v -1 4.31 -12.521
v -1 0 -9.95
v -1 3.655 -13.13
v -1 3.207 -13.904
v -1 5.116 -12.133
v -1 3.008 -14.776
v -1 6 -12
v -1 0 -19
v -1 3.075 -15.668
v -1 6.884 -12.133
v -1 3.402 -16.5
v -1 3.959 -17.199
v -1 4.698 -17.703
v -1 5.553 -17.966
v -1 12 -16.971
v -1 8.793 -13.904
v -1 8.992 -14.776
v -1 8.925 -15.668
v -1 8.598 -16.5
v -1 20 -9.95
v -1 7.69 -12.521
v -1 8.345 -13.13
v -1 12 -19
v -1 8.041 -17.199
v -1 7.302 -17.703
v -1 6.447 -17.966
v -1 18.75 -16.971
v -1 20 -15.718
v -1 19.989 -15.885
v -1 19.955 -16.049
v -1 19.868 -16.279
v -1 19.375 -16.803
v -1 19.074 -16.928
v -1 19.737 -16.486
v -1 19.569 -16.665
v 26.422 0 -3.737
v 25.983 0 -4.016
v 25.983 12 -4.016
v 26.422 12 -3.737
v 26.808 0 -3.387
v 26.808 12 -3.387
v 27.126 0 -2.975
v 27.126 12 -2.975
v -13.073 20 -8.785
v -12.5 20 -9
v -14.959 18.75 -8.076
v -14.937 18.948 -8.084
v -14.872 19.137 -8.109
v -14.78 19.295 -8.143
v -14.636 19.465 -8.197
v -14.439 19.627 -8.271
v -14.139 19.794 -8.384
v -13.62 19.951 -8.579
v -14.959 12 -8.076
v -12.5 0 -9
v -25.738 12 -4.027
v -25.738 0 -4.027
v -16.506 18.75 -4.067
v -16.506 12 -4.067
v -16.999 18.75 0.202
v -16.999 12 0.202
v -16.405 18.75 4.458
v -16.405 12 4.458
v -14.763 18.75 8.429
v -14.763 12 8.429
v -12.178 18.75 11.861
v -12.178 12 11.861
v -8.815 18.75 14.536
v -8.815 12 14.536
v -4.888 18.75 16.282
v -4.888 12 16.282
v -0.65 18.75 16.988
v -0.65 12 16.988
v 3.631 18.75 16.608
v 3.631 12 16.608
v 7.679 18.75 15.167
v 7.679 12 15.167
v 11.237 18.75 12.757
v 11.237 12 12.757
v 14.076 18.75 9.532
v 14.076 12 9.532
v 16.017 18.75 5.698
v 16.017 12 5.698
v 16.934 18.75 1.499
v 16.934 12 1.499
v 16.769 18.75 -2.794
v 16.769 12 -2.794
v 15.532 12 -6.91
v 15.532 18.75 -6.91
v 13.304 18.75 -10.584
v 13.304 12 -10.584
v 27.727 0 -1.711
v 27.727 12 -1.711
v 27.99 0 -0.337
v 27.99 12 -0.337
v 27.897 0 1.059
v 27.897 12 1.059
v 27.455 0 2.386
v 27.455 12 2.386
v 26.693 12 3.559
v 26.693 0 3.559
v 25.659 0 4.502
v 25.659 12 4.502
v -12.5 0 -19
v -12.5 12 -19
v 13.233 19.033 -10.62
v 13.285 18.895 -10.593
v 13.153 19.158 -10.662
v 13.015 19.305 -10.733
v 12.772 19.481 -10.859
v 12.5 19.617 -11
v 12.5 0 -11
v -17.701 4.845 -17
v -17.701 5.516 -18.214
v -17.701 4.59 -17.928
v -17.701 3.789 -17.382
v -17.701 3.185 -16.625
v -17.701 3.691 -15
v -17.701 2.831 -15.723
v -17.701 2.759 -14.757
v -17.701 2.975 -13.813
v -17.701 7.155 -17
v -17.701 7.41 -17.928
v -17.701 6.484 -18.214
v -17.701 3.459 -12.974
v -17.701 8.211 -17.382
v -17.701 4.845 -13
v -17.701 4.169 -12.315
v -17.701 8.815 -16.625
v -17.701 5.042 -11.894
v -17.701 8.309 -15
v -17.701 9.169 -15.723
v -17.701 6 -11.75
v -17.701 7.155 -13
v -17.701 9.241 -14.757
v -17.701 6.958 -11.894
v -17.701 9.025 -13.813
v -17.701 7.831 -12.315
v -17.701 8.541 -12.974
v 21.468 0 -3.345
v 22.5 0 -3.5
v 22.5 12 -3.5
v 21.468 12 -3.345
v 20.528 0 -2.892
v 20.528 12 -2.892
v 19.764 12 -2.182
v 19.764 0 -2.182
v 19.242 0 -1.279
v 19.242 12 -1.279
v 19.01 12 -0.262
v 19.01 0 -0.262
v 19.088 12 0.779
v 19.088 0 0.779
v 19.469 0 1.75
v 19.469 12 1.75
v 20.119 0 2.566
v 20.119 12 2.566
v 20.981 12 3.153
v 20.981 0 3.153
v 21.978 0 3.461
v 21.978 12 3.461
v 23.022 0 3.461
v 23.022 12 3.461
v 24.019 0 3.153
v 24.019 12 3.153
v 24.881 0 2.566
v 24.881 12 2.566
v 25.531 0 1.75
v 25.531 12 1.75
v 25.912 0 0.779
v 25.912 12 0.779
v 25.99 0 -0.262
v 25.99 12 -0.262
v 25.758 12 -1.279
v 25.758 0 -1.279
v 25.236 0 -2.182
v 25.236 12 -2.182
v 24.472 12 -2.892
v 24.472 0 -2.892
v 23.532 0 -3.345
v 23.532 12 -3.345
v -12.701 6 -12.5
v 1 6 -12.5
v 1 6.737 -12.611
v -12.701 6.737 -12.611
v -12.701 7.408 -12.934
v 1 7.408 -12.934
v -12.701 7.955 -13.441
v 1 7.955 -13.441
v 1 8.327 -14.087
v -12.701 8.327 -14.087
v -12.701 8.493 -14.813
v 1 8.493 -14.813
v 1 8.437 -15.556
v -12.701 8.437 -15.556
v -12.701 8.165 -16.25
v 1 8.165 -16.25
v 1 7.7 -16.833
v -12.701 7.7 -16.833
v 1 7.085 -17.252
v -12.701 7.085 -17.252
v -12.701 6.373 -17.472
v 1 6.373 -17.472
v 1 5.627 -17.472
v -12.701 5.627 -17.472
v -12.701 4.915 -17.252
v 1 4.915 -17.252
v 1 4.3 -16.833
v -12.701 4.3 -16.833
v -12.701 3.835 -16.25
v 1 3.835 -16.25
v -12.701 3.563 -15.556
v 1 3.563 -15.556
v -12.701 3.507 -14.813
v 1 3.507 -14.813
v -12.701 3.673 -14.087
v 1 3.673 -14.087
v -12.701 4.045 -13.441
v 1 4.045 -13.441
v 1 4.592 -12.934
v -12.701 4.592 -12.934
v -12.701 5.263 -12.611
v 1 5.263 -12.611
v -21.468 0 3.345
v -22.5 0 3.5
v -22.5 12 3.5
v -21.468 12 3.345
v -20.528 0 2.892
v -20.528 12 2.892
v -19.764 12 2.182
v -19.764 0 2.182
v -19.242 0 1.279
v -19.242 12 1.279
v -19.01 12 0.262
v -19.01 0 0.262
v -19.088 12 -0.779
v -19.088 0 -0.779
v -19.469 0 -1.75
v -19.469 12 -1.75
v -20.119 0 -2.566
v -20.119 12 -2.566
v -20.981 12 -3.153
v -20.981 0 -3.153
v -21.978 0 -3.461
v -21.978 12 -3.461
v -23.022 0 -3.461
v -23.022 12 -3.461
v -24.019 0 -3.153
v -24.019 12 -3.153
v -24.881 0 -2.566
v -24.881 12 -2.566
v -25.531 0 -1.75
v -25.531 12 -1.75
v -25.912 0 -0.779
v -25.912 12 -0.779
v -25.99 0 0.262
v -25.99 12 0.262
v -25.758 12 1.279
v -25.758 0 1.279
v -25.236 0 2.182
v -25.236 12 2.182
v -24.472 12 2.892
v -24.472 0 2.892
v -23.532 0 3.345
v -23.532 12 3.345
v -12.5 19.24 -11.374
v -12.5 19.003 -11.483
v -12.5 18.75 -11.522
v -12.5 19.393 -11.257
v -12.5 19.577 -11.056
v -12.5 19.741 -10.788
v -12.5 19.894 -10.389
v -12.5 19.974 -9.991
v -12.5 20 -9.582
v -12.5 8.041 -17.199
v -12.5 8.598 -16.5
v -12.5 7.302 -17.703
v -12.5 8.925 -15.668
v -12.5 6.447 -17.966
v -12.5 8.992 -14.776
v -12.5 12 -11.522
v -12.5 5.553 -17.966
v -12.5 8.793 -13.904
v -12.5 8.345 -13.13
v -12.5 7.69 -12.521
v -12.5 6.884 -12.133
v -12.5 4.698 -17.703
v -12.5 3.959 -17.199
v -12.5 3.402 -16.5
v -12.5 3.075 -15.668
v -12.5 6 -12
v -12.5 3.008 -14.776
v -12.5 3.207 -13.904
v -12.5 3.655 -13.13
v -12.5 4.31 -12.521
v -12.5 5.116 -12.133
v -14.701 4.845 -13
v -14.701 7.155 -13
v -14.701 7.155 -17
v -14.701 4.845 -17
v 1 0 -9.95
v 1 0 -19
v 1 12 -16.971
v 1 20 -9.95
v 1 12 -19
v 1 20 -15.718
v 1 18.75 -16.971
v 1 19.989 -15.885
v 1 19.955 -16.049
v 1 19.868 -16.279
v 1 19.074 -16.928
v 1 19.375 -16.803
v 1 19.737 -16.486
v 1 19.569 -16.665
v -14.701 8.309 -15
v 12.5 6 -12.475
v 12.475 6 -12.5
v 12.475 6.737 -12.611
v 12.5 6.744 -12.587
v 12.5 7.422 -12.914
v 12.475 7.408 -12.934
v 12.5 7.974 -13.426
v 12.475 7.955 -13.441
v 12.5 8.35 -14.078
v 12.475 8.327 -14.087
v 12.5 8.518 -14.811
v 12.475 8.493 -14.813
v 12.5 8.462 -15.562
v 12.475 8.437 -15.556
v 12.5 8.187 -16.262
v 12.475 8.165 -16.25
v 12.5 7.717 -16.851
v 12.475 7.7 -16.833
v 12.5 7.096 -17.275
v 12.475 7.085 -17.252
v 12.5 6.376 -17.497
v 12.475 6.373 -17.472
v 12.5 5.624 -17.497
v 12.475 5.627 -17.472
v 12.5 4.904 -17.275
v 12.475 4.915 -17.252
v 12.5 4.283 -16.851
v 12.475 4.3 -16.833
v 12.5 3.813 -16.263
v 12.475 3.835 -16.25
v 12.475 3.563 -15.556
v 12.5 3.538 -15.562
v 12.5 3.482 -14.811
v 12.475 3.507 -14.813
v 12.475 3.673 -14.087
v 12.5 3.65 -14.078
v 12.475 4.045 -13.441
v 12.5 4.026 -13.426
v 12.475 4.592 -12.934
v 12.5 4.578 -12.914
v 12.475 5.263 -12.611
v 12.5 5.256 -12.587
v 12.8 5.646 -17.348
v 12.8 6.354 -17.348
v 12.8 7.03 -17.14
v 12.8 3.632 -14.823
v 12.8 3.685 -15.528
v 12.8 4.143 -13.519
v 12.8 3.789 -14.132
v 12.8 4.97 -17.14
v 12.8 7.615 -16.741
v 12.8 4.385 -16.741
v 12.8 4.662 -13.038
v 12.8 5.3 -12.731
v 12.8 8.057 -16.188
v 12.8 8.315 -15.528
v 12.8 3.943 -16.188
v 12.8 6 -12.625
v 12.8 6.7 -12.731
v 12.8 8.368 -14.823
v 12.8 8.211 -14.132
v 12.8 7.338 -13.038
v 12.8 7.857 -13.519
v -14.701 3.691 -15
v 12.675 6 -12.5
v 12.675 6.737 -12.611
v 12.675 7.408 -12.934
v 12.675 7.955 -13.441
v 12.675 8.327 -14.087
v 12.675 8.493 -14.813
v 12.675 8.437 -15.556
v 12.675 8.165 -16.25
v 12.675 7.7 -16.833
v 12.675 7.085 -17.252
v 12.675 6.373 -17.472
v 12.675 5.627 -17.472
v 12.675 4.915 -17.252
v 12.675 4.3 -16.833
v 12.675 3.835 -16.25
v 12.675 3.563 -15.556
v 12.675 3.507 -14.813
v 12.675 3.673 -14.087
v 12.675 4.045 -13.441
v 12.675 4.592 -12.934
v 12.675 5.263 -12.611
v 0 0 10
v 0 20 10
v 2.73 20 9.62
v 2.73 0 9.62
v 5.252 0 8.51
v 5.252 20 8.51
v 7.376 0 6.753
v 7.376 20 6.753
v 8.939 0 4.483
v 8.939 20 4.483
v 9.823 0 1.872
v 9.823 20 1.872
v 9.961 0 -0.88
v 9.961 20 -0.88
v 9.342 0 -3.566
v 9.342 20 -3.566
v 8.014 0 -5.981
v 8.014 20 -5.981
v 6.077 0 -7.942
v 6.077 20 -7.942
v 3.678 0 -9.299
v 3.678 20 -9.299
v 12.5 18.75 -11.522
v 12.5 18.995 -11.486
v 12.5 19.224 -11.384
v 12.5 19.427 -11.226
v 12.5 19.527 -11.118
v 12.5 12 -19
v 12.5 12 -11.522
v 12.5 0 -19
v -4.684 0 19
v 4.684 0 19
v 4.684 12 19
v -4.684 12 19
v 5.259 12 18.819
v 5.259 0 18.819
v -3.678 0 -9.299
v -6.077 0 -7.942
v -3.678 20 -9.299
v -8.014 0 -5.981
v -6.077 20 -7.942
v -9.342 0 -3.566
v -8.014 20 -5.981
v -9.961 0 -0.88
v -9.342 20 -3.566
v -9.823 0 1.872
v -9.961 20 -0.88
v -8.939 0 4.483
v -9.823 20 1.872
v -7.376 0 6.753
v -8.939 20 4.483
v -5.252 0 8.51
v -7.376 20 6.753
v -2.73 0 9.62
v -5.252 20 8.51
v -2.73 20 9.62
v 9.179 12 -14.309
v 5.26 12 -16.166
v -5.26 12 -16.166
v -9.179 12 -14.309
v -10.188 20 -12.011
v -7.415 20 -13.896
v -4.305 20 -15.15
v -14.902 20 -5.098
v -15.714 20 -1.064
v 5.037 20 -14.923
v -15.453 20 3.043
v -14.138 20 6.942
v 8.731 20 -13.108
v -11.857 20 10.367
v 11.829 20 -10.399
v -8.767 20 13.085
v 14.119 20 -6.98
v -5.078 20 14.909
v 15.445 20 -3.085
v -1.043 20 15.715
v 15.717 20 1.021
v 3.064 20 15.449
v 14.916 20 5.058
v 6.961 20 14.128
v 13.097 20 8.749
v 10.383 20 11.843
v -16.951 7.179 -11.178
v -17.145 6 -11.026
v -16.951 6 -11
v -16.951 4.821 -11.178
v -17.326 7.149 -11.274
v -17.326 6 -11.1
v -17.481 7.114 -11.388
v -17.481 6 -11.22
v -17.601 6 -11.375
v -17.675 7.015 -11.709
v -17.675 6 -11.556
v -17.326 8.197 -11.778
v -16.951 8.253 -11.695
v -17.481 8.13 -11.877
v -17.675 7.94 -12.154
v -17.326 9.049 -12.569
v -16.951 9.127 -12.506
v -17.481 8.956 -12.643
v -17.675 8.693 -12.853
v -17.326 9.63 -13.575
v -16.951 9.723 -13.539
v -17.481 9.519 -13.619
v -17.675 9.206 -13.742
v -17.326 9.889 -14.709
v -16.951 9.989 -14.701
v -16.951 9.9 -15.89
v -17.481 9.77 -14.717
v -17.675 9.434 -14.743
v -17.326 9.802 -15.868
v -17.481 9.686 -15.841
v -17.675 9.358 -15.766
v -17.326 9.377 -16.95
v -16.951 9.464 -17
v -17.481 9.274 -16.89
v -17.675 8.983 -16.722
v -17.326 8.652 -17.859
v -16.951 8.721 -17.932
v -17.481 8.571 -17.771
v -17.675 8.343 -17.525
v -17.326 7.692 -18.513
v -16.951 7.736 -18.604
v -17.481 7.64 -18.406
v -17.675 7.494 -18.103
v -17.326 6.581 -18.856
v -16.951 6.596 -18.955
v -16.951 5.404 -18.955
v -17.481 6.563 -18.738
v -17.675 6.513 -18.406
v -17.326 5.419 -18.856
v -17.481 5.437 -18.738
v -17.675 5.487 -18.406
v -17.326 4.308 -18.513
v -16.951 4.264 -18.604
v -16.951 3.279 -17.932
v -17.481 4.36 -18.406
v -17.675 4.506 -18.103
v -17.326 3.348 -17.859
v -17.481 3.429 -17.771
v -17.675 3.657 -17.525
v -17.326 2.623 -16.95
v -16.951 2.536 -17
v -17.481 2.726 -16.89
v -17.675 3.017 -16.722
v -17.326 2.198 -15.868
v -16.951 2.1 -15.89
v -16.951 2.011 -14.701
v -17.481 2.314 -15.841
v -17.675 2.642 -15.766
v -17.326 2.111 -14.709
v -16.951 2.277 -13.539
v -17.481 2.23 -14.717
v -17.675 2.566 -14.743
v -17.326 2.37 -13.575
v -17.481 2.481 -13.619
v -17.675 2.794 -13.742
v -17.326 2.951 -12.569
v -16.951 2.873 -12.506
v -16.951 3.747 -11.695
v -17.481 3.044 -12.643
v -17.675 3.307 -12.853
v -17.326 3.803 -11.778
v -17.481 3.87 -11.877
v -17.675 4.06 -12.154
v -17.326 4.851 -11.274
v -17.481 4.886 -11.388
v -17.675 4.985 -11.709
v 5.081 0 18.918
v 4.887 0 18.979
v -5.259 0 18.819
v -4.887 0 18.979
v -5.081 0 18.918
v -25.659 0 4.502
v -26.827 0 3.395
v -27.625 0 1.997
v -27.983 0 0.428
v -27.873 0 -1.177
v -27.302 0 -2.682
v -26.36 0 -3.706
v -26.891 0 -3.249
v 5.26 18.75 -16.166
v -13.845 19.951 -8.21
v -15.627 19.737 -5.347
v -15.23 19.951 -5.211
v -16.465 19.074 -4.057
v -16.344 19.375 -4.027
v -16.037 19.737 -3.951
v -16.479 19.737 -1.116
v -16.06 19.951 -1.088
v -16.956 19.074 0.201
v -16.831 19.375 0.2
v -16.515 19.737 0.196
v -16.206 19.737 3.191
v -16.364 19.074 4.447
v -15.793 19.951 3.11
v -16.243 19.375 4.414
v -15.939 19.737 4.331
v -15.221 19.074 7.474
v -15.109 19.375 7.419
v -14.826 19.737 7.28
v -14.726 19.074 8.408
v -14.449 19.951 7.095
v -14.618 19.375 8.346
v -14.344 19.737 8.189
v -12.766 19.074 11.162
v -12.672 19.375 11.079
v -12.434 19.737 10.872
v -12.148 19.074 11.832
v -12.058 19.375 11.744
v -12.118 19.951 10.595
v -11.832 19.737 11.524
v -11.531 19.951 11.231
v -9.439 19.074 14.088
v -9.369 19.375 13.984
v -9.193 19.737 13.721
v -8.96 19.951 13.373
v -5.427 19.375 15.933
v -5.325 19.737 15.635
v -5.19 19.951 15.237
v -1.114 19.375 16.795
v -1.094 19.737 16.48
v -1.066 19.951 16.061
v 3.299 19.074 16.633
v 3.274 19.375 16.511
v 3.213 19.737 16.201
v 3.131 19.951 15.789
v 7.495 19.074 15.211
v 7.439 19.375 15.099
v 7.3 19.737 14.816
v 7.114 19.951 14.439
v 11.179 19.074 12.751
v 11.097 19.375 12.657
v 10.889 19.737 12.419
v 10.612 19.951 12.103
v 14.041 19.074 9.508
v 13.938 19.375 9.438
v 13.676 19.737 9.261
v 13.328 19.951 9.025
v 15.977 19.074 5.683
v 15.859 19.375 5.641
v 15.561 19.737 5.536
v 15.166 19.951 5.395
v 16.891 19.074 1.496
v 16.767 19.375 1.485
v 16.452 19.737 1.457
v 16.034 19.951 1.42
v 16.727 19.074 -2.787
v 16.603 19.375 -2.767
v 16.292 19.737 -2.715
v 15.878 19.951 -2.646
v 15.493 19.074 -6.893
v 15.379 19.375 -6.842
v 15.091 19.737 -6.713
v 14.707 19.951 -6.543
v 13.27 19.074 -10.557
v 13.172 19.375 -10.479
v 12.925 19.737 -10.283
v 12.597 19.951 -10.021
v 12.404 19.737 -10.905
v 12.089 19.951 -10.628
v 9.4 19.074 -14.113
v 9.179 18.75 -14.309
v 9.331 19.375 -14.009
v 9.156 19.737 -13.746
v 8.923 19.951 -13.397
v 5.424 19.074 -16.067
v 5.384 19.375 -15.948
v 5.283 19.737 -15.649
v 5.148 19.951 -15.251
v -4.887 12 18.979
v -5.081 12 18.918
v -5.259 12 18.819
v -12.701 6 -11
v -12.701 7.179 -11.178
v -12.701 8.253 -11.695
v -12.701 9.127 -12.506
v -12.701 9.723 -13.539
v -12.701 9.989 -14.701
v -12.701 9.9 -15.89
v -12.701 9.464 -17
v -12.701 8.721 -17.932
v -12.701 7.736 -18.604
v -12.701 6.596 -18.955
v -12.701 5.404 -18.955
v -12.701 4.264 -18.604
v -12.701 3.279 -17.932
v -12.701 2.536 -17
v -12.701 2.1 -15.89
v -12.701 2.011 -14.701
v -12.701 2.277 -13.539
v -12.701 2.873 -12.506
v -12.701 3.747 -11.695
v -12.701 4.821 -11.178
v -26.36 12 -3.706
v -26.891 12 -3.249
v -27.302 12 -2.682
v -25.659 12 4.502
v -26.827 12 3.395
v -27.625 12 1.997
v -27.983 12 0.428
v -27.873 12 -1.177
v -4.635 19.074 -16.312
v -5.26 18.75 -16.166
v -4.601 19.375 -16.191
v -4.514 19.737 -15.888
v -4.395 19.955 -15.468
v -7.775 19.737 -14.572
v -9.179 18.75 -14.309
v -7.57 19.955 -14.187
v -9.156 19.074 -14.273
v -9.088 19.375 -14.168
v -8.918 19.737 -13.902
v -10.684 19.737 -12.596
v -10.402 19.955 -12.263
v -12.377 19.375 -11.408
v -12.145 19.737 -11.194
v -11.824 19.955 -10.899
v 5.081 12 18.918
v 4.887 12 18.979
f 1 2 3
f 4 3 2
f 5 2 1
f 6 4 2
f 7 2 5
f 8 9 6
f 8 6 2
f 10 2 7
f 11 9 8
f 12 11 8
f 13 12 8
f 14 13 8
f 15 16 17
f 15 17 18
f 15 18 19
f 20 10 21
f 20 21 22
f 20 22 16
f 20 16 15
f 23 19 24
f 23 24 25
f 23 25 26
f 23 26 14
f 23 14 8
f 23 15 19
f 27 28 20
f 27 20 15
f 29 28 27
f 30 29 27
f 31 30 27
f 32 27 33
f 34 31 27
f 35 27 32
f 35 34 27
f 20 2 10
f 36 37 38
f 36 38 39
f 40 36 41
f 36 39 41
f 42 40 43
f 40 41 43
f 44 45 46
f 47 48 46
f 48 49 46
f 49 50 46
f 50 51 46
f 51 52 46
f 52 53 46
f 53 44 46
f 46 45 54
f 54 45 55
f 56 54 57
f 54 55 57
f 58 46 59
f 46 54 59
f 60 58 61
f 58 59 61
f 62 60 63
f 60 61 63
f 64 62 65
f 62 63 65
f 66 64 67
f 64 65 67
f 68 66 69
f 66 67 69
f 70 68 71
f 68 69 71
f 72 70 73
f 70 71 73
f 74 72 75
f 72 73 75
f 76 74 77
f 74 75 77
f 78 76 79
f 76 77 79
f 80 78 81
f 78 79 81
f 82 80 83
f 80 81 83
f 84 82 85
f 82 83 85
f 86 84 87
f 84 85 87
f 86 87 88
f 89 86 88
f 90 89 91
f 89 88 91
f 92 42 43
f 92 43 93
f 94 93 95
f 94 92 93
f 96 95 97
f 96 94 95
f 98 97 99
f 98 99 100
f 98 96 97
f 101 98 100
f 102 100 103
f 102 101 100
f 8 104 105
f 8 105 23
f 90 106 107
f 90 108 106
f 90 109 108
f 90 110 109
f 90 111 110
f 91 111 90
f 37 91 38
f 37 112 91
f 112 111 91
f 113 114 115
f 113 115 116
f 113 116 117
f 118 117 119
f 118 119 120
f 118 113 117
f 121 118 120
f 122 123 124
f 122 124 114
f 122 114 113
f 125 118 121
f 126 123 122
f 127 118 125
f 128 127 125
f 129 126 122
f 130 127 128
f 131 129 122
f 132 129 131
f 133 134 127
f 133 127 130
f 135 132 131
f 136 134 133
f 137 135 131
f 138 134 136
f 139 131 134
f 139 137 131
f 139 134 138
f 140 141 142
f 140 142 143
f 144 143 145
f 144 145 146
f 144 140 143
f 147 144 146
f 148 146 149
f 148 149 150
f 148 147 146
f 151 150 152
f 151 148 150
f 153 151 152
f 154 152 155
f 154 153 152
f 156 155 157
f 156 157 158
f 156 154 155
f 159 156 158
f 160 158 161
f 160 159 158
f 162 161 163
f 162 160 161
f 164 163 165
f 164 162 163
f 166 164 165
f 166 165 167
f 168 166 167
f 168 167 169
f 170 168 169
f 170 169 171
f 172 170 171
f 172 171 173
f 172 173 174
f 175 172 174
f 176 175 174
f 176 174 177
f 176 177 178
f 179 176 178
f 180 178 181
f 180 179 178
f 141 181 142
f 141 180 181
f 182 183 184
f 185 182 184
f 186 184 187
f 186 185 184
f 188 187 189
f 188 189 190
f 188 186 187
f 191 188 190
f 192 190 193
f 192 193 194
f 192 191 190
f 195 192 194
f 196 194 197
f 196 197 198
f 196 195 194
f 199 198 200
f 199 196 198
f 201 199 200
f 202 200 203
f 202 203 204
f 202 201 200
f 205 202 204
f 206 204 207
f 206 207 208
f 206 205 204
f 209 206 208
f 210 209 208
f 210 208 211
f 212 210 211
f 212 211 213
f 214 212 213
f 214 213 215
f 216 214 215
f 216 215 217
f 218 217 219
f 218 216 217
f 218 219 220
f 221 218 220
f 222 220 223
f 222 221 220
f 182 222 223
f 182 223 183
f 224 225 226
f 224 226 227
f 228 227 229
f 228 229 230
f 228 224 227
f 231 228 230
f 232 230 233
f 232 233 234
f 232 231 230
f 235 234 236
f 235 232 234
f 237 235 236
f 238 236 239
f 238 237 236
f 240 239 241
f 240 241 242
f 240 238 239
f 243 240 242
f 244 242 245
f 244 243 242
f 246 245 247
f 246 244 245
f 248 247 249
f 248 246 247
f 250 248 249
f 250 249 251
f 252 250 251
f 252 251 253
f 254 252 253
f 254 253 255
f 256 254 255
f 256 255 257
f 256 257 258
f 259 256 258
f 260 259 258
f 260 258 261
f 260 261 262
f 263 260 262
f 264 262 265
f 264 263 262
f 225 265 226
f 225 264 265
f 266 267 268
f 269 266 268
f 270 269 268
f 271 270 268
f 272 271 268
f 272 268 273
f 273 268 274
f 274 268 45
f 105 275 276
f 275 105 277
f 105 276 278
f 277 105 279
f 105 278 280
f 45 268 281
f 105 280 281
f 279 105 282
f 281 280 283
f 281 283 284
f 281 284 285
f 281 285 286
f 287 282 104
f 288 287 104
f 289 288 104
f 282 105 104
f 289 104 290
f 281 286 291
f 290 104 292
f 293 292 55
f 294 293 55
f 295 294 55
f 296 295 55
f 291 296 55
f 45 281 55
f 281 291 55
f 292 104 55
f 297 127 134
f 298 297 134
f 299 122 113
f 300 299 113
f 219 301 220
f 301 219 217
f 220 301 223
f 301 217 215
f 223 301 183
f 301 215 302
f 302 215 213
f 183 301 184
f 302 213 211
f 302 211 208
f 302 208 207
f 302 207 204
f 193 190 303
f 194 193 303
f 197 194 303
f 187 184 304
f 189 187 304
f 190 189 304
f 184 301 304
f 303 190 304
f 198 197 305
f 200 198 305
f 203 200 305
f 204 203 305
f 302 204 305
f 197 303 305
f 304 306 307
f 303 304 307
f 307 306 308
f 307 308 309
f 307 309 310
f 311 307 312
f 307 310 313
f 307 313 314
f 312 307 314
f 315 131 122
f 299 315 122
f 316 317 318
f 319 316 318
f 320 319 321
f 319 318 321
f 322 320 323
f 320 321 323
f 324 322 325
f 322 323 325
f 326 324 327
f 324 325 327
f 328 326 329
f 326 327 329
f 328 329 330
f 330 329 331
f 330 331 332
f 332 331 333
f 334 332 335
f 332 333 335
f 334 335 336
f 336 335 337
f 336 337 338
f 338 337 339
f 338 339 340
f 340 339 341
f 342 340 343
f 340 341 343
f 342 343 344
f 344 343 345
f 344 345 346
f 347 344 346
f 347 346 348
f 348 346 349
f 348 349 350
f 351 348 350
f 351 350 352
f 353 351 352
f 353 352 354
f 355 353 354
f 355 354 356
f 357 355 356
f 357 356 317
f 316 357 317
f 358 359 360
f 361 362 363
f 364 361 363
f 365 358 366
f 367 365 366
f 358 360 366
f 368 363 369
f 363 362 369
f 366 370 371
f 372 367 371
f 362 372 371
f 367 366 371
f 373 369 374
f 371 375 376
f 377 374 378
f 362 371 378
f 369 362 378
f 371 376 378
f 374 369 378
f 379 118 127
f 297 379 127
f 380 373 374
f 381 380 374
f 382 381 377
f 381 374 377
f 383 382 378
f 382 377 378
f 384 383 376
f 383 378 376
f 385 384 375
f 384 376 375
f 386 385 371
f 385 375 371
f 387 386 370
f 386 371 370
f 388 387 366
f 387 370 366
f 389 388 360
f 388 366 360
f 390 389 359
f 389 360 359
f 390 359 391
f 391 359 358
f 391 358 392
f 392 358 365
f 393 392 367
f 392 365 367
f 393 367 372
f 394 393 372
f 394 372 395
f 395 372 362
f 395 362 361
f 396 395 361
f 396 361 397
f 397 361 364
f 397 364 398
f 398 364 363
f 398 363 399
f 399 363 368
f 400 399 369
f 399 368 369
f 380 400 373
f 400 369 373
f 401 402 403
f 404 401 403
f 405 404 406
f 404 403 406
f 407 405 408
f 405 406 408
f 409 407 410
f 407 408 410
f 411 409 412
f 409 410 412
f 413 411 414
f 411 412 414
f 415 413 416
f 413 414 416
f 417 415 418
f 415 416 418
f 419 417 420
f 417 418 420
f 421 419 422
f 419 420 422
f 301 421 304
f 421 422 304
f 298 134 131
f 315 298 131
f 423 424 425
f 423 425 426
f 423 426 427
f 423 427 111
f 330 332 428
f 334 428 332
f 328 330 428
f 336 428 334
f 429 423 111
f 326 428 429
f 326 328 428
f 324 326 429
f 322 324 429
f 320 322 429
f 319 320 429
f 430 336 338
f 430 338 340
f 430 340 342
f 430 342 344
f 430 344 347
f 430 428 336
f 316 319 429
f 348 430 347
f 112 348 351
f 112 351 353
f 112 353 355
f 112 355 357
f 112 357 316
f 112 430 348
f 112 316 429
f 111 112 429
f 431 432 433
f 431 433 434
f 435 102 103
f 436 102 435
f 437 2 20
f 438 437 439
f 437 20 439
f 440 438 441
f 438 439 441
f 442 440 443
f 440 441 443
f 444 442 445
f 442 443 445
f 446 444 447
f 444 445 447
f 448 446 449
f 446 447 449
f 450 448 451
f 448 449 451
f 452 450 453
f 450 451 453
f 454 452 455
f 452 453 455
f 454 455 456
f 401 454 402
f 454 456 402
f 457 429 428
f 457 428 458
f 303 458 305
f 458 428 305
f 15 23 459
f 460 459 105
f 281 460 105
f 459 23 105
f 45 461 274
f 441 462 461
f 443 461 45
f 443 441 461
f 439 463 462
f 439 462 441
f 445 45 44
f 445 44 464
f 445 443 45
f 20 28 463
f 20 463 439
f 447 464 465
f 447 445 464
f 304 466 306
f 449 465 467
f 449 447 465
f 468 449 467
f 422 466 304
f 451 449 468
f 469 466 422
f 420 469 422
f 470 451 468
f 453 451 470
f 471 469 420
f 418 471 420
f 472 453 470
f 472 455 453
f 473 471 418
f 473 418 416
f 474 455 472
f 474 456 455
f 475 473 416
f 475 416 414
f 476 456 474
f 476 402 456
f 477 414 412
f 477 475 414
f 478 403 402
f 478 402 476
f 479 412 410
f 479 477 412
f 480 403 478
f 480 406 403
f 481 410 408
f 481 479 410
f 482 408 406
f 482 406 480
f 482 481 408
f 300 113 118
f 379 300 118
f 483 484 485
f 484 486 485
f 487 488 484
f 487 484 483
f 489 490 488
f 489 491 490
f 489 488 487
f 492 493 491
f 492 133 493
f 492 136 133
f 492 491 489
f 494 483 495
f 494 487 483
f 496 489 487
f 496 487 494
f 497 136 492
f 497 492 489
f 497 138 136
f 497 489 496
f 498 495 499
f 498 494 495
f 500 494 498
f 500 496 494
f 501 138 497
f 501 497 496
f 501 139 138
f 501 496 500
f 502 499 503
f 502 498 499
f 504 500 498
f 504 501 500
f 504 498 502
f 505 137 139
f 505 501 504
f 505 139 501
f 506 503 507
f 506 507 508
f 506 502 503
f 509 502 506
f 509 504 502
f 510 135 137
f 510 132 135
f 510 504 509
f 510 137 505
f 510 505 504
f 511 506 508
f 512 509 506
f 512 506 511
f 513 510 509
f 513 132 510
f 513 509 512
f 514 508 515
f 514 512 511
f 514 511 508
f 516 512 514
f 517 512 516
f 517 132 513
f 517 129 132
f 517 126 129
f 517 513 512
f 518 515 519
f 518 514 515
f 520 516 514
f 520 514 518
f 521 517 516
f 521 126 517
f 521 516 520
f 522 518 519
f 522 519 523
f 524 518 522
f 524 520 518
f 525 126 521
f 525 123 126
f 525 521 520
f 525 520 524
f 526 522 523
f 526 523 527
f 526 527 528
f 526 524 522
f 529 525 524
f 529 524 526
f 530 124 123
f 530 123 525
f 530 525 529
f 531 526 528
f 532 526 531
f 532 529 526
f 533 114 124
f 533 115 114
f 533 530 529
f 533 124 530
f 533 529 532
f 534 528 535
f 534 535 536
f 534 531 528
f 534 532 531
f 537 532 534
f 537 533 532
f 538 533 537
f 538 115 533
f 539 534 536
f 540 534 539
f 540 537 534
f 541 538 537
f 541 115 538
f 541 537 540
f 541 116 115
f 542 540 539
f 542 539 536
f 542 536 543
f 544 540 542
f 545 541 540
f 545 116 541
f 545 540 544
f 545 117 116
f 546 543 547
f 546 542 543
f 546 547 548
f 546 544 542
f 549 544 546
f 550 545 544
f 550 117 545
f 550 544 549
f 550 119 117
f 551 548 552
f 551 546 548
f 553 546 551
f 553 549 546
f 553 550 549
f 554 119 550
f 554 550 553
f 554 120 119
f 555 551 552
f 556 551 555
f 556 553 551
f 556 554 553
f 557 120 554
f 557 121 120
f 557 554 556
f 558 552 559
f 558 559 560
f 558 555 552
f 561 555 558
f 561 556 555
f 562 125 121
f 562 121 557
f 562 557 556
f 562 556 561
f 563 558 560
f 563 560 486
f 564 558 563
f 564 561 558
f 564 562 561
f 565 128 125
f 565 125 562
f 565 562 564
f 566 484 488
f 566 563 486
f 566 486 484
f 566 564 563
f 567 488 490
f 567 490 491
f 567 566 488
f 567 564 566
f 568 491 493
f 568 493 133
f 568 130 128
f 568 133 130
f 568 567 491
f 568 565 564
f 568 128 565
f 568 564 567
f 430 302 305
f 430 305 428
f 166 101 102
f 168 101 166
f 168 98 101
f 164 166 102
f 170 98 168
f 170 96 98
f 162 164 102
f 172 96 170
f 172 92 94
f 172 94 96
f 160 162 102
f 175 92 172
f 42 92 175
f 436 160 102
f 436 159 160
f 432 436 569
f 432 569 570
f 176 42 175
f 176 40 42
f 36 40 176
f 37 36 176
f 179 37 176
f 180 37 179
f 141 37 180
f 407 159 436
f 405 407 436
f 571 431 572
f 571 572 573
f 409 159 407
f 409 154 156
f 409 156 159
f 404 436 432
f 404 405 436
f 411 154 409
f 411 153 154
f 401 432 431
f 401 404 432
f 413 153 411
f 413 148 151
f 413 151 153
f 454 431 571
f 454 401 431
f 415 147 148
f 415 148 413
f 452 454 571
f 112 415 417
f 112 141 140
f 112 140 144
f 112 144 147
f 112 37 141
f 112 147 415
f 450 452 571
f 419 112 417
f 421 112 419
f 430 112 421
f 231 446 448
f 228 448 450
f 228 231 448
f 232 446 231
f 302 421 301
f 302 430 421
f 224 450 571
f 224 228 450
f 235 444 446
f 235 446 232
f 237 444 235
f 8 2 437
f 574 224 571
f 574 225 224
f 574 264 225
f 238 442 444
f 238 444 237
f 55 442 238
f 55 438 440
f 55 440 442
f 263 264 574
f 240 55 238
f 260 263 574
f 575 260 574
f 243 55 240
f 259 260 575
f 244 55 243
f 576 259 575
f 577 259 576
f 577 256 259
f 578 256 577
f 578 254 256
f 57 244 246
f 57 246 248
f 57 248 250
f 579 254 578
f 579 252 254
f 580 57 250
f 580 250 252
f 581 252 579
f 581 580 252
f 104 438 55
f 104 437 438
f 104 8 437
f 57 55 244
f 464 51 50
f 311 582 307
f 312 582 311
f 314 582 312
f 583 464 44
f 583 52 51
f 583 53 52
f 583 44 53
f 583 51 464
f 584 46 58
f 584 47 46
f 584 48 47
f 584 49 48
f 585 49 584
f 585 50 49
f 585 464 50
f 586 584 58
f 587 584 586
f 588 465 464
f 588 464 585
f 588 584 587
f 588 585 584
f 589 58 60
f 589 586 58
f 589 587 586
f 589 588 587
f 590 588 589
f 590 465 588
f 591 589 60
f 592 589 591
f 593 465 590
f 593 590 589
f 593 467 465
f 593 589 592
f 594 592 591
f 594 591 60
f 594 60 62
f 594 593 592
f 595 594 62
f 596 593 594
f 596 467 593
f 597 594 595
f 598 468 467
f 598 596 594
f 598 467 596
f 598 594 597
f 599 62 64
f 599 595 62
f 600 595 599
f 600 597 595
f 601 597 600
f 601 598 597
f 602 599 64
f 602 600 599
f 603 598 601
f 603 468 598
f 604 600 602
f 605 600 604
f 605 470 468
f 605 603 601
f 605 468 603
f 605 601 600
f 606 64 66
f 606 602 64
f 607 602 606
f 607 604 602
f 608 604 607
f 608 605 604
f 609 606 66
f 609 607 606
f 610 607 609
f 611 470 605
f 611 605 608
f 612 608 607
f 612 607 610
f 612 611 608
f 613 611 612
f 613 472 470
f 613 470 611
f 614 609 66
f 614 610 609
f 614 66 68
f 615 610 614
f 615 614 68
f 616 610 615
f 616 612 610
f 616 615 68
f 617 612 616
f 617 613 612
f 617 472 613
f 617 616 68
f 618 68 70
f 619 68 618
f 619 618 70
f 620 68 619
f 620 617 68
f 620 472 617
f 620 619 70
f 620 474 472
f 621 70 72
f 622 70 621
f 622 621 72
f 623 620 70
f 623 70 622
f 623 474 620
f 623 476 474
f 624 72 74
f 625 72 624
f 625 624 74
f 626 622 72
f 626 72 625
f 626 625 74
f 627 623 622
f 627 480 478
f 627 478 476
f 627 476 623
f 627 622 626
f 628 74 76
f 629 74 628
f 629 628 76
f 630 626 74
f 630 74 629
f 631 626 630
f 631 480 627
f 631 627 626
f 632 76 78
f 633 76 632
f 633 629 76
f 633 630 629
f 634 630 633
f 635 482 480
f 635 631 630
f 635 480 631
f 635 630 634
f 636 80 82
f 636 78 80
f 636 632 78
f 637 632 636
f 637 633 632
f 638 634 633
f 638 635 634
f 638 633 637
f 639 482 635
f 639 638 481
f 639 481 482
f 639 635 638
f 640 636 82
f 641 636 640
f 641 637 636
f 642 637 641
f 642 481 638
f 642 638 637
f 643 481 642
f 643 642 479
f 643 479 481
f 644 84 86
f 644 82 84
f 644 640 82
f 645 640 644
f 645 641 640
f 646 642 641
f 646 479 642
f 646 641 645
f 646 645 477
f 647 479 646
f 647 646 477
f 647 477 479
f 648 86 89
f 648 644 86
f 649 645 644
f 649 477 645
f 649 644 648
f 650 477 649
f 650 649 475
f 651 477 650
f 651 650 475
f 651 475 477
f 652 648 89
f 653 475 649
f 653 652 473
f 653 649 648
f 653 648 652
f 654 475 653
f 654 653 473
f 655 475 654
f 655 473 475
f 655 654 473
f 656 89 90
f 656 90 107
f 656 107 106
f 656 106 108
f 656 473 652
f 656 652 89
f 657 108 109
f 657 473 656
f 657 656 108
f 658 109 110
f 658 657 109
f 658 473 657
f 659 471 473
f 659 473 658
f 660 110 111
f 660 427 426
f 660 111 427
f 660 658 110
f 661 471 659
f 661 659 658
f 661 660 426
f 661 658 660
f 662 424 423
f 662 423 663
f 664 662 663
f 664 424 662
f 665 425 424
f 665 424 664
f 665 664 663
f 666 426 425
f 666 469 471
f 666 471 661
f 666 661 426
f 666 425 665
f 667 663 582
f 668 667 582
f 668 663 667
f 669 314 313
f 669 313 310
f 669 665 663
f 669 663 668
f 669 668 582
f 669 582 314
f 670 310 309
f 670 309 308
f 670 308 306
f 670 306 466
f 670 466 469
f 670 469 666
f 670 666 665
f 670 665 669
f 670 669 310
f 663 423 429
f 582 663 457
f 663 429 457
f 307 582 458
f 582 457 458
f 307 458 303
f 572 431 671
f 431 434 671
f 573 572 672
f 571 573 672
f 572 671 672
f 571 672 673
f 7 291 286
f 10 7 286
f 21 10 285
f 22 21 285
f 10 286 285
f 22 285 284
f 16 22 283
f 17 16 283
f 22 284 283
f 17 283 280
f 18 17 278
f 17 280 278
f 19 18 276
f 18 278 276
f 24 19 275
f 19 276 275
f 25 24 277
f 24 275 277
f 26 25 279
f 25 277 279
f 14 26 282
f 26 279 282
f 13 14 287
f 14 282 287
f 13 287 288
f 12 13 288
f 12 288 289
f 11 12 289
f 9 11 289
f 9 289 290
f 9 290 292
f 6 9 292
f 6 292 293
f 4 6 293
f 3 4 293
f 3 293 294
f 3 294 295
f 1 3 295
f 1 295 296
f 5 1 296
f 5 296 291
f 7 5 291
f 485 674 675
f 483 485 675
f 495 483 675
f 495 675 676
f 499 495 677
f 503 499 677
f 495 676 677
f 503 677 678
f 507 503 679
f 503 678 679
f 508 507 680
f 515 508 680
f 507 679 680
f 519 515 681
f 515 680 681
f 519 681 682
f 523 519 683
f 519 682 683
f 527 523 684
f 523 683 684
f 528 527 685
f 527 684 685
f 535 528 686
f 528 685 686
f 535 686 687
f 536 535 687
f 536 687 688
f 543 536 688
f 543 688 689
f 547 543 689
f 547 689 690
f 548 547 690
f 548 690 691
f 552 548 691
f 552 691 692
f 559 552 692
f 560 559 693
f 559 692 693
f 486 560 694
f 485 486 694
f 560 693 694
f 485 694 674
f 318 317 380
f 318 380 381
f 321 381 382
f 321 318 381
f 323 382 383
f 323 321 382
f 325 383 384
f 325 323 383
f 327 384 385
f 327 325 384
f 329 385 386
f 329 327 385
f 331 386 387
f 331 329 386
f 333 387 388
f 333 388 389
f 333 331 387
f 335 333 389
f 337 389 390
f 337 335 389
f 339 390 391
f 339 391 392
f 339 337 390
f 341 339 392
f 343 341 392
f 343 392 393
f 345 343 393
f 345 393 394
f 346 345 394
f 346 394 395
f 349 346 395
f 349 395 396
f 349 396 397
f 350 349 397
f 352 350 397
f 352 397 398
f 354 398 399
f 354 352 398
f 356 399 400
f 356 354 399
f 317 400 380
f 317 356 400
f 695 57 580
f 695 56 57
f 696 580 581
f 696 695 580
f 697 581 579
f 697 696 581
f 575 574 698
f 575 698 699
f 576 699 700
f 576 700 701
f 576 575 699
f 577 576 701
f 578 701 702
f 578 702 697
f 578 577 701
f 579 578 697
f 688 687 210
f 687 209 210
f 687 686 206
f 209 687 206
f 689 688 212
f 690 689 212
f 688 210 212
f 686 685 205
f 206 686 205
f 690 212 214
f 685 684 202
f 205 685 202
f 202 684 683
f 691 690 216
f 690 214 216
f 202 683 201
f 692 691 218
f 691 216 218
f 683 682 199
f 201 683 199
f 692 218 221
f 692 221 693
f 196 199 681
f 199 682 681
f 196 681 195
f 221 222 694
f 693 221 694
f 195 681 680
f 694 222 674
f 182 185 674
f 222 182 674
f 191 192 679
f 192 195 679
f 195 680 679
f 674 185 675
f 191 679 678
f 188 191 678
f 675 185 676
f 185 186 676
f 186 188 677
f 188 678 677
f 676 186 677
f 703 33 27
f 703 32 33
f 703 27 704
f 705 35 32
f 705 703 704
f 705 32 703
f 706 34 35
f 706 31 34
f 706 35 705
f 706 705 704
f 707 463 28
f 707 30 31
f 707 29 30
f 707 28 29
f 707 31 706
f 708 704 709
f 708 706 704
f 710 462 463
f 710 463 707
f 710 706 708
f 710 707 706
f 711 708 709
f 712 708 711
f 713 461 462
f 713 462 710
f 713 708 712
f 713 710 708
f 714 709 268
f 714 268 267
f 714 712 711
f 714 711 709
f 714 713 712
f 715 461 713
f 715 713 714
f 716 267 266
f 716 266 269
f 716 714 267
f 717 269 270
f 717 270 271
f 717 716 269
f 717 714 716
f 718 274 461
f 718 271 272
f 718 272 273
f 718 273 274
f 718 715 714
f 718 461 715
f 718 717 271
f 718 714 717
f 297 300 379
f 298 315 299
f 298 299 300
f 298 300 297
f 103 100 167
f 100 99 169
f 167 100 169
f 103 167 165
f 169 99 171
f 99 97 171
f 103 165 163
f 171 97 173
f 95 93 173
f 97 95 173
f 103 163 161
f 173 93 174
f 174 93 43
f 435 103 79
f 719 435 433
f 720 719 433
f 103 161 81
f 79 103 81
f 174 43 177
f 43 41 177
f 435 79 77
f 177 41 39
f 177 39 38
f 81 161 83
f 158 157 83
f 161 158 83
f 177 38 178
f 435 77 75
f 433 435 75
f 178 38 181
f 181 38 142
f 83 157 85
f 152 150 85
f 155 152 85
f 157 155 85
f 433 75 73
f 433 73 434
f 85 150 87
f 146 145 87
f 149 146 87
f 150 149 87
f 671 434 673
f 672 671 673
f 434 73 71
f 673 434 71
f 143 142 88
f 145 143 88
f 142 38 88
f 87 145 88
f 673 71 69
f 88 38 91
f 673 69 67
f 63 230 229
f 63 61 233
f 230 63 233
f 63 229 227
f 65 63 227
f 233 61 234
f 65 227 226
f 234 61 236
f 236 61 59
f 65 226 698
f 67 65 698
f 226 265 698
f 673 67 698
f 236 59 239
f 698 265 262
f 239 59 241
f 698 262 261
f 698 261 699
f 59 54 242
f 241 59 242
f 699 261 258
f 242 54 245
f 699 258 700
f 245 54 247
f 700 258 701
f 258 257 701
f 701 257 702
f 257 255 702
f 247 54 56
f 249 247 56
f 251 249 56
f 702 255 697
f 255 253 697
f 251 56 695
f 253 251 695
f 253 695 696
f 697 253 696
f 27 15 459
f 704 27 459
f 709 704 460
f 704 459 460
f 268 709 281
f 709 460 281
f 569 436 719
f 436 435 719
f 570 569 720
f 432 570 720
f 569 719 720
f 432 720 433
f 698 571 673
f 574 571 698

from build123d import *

# Parameters (mm, degrees)
SKETCH1_R                   = 3.5
BOSS_EXTRUDE1_DEPTH         = 12
SKETCH3_R                   = 17
BOSS_EXTRUDE2_DEPTH         = 8
FILLET1_R                   = 1.25
CUT_EXTRUDE1_DEPTH          = 36.902646142
CUT_EXTRUDE1_DEPTH_BACK     = 36.902646142
SKETCH4_R                   = 10
CUT_EXTRUDE2_DEPTH          = 40.306488113
CUT_EXTRUDE2_DEPTH_BACK     = 40.306488113
SKETCH5_W                   = 2
SKETCH5_H                   = 20
CUT_EXTRUDE3_DEPTH          = 40.306488113
CUT_EXTRUDE3_DEPTH_BACK     = 40.306488113
SKETCH7_R                   = 3
CUT_EXTRUDE4_DEPTH          = 12.5
FILLET2_R                   = 3
FILLET3_R                   = 1
M5_TAPPED_HOLE2_D           = 4.2
M5_TAPPED_HOLE2_CSINK_D     = 5.05
M5_TAPPED_HOLE2_CSINK_ANGLE = 90
SKETCH26_R                  = 2.5
BOSS_EXTRUDE4_DEPTH         = 0.001
BOSS_EXTRUDE4_DEPTH_BACK    = 25.5
SKETCH28_R                  = 4
BOSS_EXTRUDE5_DEPTH         = 5
CHAMFER1_SIZE               = 0.125
CUT_EXTRUDE5_DEPTH          = 3
FILLET4_R                   = 0.75


with BuildPart() as part:
    # Sketch1 → Boss-Extrude1 (new body)
    with BuildSketch(Plane(origin=(0, 0, 0), x_dir=(1, 0, 0), z_dir=(0, 1, 0))):
        with BuildLine():
            Line((5, -19), (-5, -19))
            Line((-5, -19), (-25.659364193, -4.502045968))
            ThreePointArc((-25.659364193, -4.502045968), (-27.968143757, -0.591103926), (-26.548475243, 3.722881707))
            Line((-26.548475243, 3.722881707), (-12.5, 19))
            Line((-12.5, 19), (12.5, 19))
            Line((12.5, 19), (26.548475243, 3.722881707))
            ThreePointArc((26.548475243, 3.722881707), (27.968143757, -0.591103926), (25.659364193, -4.502045968))
            Line((25.659364193, -4.502045968), (5, -19))
        make_face()
        with Locations(Location((-22.5, 0, 0), (0, 0, 270))):
            Circle(SKETCH1_R, mode=Mode.SUBTRACT)
        with Locations(Location((22.5, 0, 0), (0, 0, 90))):
            Circle(SKETCH1_R, mode=Mode.SUBTRACT)
    extrude(amount=BOSS_EXTRUDE1_DEPTH)

    # Sketch3 → Boss-Extrude2 (add)
    with BuildSketch(Plane(origin=(0, 12, 0), x_dir=(1, 0, 0), z_dir=(0, 1, 0))):
        with Locations(Location((0, 0, 0), (0, 0, 270))):
            Circle(SKETCH3_R)
    extrude(amount=BOSS_EXTRUDE2_DEPTH)

    # Fillet1
    fillet1_edges = [part.edges().sort_by_distance(p)[0] for p in [
        (0, 20, -17),
    ]]
    fillet(fillet1_edges, radius=FILLET1_R)

    # Sketch2 → Cut-Extrude1 (cut, two sides)
    with BuildSketch(Plane(origin=(0, 12, 0), x_dir=(1, 0, 0), z_dir=(0, 1, 0))) as cut_extrude1_sk:
        Polygon((12.5, 19), (12.5, 11), (26.548475243, 3.722881707), align=None)
        Polygon((-12.5, 19), (-12.5, 8.999645995), (-26.548475243, 3.722881707), align=None)
    extrude(amount=CUT_EXTRUDE1_DEPTH, mode=Mode.SUBTRACT)
    extrude(cut_extrude1_sk.sketch, amount=-CUT_EXTRUDE1_DEPTH_BACK, mode=Mode.SUBTRACT)

    # Sketch4 → Cut-Extrude2 (cut, two sides)
    with BuildSketch(Plane(origin=(0, 20, 0), x_dir=(1, 0, 0), z_dir=(0, 1, 0))) as cut_extrude2_sk:
        with Locations(Location((0, 0, 0), (0, 0, 270))):
            Circle(SKETCH4_R)
    extrude(amount=CUT_EXTRUDE2_DEPTH, mode=Mode.SUBTRACT)
    extrude(cut_extrude2_sk.sketch, amount=-CUT_EXTRUDE2_DEPTH_BACK, mode=Mode.SUBTRACT)

    # Sketch5 → Cut-Extrude3 (cut, two sides)
    with BuildSketch(Plane(origin=(0, 20, 0), x_dir=(1, 0, 0), z_dir=(0, 1, 0))) as cut_extrude3_sk:
        with Locations((0, 10)):
            Rectangle(SKETCH5_W, SKETCH5_H)
    extrude(amount=CUT_EXTRUDE3_DEPTH, mode=Mode.SUBTRACT)
    extrude(cut_extrude3_sk.sketch, amount=-CUT_EXTRUDE3_DEPTH_BACK, mode=Mode.SUBTRACT)

    # Sketch7 → Cut-Extrude4 (cut)
    with BuildSketch(Plane.ZY.offset(12.5)):
        with Locations((-15, 6)):
            Circle(SKETCH7_R)
    extrude(amount=-CUT_EXTRUDE4_DEPTH, mode=Mode.SUBTRACT)

    # Fillet2
    fillet2_edges = [part.edges().sort_by_distance(p)[0] for p in [
        (26.548475243, 6, -3.722881707),
        (-26.548475243, 6, -3.722881707),
    ]]
    fillet(fillet2_edges, radius=FILLET2_R)

    # Fillet3
    fillet3_edges = [part.edges().sort_by_distance(p)[0] for p in [
        (5, 6, 19),
        (-5, 6, 19),
    ]]
    fillet(fillet3_edges, radius=FILLET3_R)

    # M5 Tapped Hole2 (through all)
    with Locations(Plane(origin=(12.5, 0, 0), x_dir=(0, 0, -1), z_dir=(1, 0, 0))):
        with Locations((15, 6)):
            CounterSinkHole(M5_TAPPED_HOLE2_D / 2, M5_TAPPED_HOLE2_CSINK_D / 2, counter_sink_angle=M5_TAPPED_HOLE2_CSINK_ANGLE)



with BuildPart() as body_2:
    # Sketch26 → Boss-Extrude4 (new, two sides)
    with BuildSketch(Plane.ZY.offset(12.7)) as boss_extrude4_sk:
        with Locations((-15, 6)):
            Circle(SKETCH26_R)
    extrude(amount=BOSS_EXTRUDE4_DEPTH)
    extrude(boss_extrude4_sk.sketch, amount=-BOSS_EXTRUDE4_DEPTH_BACK)


with BuildPart() as part_1:
    add(part.part)

    add(body_2.part)  # Boss-Extrude5 merges body 2
    # Sketch28 → Boss-Extrude5 (add)
    with BuildSketch(Plane.ZY.offset(12.701)):
        with Locations((-15, 6)):
            Circle(SKETCH28_R)
    extrude(amount=BOSS_EXTRUDE5_DEPTH)

    # Chamfer1
    chamfer1_edges = [part_1.edges().sort_by_distance(p)[0] for p in [
        (12.8, 6, -17.5),
    ]]
    chamfer(chamfer1_edges, length=CHAMFER1_SIZE)

    # Sketch29 → Cut-Extrude5 (cut)
    with BuildSketch(Plane.ZY.offset(17.701)):
        Polygon((-15, 8.309401077), (-17, 7.154700538), (-17, 4.845299462), (-15, 3.690598923), (-13, 4.845299462), (-13, 7.154700538), align=None)
    extrude(amount=-CUT_EXTRUDE5_DEPTH, mode=Mode.SUBTRACT)

    # Fillet4
    fillet4_edges = [part_1.edges().sort_by_distance(p)[0] for p in [
        (-17.701, 6, -19),
    ]]
    fillet(fillet4_edges, radius=FILLET4_R)


solid = part_1.part
